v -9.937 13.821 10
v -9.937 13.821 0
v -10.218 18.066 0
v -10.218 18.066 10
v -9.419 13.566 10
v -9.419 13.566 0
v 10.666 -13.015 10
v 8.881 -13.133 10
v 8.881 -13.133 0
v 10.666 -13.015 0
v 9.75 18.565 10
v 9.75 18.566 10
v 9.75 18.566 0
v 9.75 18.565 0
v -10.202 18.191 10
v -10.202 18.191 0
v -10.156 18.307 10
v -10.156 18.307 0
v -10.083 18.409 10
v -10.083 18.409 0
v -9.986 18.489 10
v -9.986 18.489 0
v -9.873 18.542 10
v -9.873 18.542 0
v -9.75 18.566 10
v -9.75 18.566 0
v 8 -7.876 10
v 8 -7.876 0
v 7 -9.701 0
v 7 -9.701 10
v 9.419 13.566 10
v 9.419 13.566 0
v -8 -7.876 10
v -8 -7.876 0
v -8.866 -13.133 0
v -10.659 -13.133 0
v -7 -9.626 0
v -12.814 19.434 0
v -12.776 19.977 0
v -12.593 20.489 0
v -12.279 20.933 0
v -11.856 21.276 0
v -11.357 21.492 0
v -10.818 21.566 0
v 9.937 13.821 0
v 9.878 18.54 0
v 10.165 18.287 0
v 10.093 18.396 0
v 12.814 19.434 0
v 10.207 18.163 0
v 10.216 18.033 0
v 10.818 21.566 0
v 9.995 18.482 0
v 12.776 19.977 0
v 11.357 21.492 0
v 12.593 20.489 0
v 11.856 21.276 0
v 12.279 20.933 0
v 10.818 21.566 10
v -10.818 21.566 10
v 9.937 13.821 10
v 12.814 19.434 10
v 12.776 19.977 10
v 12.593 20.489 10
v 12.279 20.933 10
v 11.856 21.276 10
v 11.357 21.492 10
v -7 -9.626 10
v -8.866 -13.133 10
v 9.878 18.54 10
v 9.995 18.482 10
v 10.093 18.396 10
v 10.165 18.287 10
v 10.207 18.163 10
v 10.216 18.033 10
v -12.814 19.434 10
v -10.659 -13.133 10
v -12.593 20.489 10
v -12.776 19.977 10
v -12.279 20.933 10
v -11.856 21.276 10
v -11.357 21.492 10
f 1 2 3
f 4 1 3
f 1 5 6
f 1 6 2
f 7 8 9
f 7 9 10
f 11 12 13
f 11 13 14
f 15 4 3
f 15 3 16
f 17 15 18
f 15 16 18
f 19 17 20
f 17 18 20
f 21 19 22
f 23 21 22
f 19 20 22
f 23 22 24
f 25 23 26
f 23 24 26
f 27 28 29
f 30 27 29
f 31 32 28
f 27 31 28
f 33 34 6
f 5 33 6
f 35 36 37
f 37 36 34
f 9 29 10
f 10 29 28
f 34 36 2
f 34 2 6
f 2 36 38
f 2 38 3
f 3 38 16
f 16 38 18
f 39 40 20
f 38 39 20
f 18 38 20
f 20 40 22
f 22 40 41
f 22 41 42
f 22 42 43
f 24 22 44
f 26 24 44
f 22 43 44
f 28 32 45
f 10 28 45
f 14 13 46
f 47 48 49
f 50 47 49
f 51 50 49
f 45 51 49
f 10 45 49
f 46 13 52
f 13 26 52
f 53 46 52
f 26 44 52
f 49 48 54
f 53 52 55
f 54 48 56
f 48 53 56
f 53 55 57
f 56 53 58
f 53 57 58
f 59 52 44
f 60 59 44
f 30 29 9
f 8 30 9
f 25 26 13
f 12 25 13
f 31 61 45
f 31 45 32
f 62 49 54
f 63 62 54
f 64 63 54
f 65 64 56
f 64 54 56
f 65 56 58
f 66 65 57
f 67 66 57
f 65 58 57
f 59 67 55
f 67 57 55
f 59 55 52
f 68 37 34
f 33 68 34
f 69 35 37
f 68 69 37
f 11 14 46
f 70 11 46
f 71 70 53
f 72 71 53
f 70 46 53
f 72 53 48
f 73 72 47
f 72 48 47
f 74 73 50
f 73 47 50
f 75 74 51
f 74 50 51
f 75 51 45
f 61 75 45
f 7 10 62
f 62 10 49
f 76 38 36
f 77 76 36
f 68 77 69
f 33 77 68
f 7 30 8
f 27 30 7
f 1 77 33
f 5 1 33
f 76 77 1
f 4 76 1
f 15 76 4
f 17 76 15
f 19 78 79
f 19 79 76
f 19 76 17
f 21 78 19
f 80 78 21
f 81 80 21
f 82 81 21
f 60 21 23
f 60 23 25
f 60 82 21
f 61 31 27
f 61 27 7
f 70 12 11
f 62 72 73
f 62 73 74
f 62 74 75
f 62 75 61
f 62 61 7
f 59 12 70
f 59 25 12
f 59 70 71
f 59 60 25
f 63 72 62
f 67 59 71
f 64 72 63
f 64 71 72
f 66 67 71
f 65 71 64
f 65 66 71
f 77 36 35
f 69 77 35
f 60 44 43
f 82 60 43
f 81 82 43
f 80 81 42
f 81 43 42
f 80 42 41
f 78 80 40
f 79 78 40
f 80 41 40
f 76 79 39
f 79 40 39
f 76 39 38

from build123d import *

# Parameters (mm, degrees)
F1_DEPTH = 10


with BuildPart() as f1:
    # F0 (on Top) → F1 (new body)
    with BuildSketch(Plane.XY):
        with BuildLine():
            ThreePointArc((-10.218003, 18.066239), (-10.082748, 18.408666), (-9.75, 18.566239))
            Line((-9.75, 18.566239), (9.75, 18.566239))
            Line((9.75, 18.566239), (9.749928, 18.565147))
            ThreePointArc((9.749928, 18.565147), (10.093038, 18.395673), (10.215817, 18.03322))
            Line((10.215817, 18.03322), (9.937061, 13.821265))
            Line((9.937061, 13.821265), (9.419089, 13.566239))
            Line((9.419089, 13.566239), (8, -7.875915))
            Line((8, -7.875915), (7, -9.70099))
            Line((7, -9.70099), (8.880575, -13.133215))
            Line((8.880575, -13.133215), (10.666446, -13.015022))
            Line((10.666446, -13.015022), (12.814004, 19.434163))
            ThreePointArc((12.814004, 19.434163), (12.278533, 20.932959), (10.81837, 21.566239))
            Line((10.81837, 21.566239), (-10.81837, 21.566239))
            ThreePointArc((-10.81837, 21.566239), (-12.278533, 20.932959), (-12.814004, 19.434163))
            Line((-12.814004, 19.434163), (-10.658623, -13.133215))
            Line((-10.658623, -13.133215), (-8.866173, -13.133215))
            Line((-8.866173, -13.133215), (-7, -9.625915))
            Line((-7, -9.625915), (-8, -7.875915))
            Line((-8, -7.875915), (-9.419089, 13.566239))
            Line((-9.419089, 13.566239), (-9.937061, 13.821265))
            Line((-9.937061, 13.821265), (-10.218003, 18.066239))
        make_face()
    extrude(amount=F1_DEPTH)


solid = f1.part
